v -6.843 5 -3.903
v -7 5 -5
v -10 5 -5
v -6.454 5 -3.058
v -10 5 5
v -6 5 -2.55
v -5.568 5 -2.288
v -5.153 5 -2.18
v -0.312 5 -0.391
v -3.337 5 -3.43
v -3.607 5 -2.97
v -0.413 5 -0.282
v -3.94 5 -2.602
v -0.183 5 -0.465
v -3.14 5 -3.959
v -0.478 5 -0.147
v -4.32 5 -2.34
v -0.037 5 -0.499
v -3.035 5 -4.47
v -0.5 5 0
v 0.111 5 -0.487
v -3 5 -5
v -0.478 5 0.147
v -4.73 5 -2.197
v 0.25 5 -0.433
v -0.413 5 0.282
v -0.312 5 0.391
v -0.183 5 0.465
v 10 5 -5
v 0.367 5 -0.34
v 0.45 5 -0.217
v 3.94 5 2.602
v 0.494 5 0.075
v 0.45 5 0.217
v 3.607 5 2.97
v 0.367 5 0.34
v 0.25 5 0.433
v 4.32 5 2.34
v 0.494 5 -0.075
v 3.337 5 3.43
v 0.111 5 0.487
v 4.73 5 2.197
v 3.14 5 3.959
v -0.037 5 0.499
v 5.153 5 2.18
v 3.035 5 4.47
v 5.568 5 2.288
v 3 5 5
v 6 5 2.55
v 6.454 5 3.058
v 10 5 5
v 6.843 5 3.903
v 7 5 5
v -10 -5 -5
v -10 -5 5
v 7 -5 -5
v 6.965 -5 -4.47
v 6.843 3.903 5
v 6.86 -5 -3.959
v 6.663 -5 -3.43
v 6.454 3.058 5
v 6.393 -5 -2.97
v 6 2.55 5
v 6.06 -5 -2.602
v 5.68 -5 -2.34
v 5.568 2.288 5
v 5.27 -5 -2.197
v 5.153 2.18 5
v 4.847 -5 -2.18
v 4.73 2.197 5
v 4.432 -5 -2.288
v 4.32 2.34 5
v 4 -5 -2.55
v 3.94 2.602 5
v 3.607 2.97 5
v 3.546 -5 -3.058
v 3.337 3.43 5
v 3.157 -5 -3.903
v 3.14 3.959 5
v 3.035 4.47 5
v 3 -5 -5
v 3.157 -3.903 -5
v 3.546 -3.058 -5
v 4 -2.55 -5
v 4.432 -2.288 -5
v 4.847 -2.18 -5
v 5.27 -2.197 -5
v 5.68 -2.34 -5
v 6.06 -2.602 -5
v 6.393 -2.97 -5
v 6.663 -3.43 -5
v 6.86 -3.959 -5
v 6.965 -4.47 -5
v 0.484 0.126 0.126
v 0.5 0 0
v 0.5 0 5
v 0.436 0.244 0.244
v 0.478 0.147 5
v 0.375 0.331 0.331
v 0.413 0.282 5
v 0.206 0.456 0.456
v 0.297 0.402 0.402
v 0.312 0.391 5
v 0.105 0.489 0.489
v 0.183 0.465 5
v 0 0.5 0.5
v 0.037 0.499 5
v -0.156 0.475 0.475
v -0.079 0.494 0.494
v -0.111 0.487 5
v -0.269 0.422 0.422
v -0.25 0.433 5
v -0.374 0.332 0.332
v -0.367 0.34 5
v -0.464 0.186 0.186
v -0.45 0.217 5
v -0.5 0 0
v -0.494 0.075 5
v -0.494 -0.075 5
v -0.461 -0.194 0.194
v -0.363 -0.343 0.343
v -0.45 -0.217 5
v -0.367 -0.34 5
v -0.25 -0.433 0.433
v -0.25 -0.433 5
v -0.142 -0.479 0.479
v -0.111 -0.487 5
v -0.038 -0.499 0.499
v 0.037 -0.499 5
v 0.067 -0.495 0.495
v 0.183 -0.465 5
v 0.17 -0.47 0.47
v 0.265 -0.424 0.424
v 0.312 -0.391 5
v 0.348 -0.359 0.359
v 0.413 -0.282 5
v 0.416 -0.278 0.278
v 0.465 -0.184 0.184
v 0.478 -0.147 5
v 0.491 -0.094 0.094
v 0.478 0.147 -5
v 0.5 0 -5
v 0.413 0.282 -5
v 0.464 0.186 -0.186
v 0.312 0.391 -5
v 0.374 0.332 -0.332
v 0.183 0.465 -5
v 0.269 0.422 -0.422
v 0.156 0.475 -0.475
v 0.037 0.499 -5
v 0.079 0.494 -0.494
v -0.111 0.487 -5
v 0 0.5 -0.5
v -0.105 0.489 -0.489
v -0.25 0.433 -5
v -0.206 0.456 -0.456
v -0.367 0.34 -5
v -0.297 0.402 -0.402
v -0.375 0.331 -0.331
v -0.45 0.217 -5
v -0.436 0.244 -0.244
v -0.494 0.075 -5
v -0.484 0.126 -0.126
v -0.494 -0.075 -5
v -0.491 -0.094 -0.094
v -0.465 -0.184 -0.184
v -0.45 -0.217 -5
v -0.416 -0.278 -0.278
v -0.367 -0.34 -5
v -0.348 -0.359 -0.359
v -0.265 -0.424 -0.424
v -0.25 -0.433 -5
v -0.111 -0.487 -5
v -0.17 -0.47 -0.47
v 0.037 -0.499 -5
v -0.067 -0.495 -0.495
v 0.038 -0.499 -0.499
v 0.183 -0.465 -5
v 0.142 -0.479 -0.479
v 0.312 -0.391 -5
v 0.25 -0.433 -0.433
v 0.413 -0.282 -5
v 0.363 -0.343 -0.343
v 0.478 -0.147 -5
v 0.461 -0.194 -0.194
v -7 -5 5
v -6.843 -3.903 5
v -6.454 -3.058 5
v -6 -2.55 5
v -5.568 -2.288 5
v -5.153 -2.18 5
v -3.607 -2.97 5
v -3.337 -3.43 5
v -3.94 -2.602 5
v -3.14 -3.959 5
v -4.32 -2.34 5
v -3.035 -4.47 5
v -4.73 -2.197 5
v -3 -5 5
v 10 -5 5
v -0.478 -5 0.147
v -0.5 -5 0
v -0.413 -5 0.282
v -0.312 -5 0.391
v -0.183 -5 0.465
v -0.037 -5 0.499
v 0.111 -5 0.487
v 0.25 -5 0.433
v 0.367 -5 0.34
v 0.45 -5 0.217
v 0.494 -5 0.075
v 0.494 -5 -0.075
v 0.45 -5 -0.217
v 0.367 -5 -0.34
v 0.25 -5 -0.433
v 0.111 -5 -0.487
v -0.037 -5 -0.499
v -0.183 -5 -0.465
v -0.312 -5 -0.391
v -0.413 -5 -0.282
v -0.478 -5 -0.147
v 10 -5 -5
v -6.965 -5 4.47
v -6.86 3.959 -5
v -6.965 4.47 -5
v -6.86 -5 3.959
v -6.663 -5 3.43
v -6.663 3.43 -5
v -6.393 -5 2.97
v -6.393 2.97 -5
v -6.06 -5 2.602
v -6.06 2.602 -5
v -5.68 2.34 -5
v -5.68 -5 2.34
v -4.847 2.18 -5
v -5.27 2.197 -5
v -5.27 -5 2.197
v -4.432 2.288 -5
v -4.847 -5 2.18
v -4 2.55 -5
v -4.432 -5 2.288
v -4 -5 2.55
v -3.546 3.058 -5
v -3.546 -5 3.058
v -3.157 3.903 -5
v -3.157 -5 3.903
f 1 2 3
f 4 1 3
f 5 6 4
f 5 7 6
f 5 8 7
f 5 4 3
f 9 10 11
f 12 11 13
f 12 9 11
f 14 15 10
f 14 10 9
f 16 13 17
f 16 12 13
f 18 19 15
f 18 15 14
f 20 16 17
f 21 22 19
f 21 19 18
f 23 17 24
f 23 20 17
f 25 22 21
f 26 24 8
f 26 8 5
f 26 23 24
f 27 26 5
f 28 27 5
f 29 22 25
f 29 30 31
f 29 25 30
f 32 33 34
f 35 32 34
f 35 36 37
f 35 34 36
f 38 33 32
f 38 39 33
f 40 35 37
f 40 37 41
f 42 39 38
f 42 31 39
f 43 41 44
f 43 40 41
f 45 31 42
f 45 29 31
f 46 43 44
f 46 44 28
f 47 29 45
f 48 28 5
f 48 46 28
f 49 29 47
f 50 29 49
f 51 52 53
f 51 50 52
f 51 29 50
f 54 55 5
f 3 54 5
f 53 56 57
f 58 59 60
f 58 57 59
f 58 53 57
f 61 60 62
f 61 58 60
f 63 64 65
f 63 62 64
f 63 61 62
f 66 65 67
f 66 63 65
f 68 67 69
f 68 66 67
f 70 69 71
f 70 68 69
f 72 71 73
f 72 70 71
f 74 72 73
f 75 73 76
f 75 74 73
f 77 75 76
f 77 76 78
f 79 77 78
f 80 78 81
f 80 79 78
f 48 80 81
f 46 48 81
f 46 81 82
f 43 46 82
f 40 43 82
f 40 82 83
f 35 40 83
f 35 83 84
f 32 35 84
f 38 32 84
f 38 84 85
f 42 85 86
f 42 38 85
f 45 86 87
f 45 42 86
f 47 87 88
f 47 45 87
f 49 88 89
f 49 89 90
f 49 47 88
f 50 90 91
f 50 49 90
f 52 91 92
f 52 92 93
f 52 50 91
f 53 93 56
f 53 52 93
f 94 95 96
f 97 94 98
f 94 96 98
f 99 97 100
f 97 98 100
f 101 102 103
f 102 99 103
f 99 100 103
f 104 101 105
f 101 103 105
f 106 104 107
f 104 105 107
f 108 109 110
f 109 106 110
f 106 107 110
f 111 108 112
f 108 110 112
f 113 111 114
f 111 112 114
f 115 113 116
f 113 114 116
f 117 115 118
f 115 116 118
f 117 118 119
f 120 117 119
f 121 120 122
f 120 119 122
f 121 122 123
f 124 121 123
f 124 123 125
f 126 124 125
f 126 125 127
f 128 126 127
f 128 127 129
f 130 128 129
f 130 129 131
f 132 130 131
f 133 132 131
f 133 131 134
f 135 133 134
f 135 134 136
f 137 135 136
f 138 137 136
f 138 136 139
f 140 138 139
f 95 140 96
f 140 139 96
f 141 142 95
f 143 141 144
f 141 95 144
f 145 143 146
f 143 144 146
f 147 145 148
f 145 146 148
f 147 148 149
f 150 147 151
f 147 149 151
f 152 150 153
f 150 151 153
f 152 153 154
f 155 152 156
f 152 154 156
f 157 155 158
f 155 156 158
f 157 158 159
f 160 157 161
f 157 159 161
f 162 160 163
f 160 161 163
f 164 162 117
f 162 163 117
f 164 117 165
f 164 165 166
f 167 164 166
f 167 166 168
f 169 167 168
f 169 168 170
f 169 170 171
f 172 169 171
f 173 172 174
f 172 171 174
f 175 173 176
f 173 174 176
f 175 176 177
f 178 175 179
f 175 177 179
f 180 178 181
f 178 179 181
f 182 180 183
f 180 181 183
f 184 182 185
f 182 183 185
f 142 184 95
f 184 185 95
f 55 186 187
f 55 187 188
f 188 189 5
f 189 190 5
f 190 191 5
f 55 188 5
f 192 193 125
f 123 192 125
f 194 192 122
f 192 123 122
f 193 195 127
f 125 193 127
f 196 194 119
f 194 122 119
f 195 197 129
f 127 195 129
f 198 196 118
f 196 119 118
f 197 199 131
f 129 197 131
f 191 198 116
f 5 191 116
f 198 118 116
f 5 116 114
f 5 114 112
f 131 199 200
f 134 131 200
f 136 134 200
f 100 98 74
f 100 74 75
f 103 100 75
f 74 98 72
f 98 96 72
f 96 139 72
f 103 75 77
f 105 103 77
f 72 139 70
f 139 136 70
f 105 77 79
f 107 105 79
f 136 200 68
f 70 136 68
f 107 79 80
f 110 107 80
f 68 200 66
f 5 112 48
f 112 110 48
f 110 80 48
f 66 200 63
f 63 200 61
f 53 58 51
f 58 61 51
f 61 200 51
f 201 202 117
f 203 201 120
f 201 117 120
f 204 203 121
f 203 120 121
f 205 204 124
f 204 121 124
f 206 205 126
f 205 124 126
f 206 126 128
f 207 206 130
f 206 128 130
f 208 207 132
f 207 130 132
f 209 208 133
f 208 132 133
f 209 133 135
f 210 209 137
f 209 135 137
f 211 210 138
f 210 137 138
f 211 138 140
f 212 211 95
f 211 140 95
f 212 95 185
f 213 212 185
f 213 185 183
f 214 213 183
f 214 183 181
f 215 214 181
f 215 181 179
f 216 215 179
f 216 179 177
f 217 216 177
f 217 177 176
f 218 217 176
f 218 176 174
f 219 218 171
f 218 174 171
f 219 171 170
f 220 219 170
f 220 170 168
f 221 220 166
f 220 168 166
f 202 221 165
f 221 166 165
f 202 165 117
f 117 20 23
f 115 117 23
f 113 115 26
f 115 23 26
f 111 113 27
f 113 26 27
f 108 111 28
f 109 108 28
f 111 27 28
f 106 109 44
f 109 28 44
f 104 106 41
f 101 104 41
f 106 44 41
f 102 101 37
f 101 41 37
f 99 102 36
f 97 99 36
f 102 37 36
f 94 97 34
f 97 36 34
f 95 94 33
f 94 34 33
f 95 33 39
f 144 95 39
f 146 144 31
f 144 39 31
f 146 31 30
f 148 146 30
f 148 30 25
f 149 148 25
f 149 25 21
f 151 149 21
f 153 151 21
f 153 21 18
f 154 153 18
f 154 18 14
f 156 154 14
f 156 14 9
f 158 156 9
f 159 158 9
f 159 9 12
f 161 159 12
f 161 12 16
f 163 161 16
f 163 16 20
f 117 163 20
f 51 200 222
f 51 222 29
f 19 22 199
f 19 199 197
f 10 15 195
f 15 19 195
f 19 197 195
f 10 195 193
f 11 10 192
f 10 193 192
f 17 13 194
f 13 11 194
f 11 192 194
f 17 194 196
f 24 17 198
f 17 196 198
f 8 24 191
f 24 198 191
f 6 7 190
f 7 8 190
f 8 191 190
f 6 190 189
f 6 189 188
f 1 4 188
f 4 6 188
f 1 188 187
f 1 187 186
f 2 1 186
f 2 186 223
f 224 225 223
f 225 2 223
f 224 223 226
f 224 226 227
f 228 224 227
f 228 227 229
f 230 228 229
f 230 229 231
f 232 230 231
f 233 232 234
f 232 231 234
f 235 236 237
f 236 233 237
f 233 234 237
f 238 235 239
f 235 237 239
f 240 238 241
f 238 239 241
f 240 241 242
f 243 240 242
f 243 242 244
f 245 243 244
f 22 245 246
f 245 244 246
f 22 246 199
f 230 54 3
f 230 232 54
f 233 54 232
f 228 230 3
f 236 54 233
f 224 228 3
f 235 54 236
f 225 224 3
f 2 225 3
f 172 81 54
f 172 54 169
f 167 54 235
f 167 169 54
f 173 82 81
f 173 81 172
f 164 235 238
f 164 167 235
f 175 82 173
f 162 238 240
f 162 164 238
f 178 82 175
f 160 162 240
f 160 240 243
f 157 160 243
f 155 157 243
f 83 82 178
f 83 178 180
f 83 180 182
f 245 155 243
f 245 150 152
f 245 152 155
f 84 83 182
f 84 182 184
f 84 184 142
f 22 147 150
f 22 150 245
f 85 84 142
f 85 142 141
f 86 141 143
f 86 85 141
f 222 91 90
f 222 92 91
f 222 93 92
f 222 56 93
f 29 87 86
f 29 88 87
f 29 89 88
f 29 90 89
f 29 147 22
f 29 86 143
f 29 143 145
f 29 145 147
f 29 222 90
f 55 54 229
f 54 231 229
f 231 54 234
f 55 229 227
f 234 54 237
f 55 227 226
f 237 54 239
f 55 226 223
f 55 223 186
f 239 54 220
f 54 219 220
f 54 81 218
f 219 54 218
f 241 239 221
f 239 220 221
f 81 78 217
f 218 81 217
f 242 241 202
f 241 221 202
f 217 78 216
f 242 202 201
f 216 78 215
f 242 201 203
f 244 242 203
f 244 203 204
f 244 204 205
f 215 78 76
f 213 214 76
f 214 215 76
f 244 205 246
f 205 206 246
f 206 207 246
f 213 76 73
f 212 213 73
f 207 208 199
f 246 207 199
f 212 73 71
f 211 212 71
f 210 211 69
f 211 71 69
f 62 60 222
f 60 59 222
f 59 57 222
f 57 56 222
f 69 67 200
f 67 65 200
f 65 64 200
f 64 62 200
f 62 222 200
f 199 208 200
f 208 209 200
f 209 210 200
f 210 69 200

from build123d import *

# Parameters (mm, degrees)
F0_W      = 10
F0_H      = 10
F1_DEPTH  = 10
F3_R      = 2
F4_DEPTH  = 14.143136
F6_R      = 2
F7_DEPTH  = 14.143136
F8_R      = 0.5
F9_DEPTH  = 10.001
F10_R     = 0.5
F11_DEPTH = 10.001


with BuildPart() as f1:
    # F0 (on Right) → F1 (new body, symmetric)
    with BuildSketch(Plane.YZ):
        Rectangle(F0_W, F0_H)
    extrude(amount=F1_DEPTH, both=True)

    # F3 (on face) → F4 (cut, through all)
    with BuildSketch(Plane(origin=(0, -5, 5), x_dir=(1, 0, 0), z_dir=(0, -0.707107, 0.707107))):
        with Locations((-5, 0)):
            Circle(F3_R)
    extrude(amount=-F4_DEPTH, mode=Mode.SUBTRACT)

    # F6 (on face) → F7 (cut, through all)
    with BuildSketch(Plane(origin=(0, 5, 5), x_dir=(1, 0, 0), z_dir=(0, -0.707107, -0.707107))):
        with Locations((5, 0)):
            Circle(F6_R)
    extrude(amount=F7_DEPTH, mode=Mode.SUBTRACT)

    # F8 (on face) → F9 (cut, through all)
    with BuildSketch(Plane(origin=(0, 5, 0), x_dir=(-1, 0, 0), z_dir=(0, 1, 0))):
        Circle(F8_R)
    extrude(amount=-F9_DEPTH, mode=Mode.SUBTRACT)

    # F10 (on face) → F11 (cut, through all)
    with BuildSketch(Plane.XY.offset(5)):
        Circle(F10_R)
    extrude(amount=-F11_DEPTH, mode=Mode.SUBTRACT)


solid = f1.part
